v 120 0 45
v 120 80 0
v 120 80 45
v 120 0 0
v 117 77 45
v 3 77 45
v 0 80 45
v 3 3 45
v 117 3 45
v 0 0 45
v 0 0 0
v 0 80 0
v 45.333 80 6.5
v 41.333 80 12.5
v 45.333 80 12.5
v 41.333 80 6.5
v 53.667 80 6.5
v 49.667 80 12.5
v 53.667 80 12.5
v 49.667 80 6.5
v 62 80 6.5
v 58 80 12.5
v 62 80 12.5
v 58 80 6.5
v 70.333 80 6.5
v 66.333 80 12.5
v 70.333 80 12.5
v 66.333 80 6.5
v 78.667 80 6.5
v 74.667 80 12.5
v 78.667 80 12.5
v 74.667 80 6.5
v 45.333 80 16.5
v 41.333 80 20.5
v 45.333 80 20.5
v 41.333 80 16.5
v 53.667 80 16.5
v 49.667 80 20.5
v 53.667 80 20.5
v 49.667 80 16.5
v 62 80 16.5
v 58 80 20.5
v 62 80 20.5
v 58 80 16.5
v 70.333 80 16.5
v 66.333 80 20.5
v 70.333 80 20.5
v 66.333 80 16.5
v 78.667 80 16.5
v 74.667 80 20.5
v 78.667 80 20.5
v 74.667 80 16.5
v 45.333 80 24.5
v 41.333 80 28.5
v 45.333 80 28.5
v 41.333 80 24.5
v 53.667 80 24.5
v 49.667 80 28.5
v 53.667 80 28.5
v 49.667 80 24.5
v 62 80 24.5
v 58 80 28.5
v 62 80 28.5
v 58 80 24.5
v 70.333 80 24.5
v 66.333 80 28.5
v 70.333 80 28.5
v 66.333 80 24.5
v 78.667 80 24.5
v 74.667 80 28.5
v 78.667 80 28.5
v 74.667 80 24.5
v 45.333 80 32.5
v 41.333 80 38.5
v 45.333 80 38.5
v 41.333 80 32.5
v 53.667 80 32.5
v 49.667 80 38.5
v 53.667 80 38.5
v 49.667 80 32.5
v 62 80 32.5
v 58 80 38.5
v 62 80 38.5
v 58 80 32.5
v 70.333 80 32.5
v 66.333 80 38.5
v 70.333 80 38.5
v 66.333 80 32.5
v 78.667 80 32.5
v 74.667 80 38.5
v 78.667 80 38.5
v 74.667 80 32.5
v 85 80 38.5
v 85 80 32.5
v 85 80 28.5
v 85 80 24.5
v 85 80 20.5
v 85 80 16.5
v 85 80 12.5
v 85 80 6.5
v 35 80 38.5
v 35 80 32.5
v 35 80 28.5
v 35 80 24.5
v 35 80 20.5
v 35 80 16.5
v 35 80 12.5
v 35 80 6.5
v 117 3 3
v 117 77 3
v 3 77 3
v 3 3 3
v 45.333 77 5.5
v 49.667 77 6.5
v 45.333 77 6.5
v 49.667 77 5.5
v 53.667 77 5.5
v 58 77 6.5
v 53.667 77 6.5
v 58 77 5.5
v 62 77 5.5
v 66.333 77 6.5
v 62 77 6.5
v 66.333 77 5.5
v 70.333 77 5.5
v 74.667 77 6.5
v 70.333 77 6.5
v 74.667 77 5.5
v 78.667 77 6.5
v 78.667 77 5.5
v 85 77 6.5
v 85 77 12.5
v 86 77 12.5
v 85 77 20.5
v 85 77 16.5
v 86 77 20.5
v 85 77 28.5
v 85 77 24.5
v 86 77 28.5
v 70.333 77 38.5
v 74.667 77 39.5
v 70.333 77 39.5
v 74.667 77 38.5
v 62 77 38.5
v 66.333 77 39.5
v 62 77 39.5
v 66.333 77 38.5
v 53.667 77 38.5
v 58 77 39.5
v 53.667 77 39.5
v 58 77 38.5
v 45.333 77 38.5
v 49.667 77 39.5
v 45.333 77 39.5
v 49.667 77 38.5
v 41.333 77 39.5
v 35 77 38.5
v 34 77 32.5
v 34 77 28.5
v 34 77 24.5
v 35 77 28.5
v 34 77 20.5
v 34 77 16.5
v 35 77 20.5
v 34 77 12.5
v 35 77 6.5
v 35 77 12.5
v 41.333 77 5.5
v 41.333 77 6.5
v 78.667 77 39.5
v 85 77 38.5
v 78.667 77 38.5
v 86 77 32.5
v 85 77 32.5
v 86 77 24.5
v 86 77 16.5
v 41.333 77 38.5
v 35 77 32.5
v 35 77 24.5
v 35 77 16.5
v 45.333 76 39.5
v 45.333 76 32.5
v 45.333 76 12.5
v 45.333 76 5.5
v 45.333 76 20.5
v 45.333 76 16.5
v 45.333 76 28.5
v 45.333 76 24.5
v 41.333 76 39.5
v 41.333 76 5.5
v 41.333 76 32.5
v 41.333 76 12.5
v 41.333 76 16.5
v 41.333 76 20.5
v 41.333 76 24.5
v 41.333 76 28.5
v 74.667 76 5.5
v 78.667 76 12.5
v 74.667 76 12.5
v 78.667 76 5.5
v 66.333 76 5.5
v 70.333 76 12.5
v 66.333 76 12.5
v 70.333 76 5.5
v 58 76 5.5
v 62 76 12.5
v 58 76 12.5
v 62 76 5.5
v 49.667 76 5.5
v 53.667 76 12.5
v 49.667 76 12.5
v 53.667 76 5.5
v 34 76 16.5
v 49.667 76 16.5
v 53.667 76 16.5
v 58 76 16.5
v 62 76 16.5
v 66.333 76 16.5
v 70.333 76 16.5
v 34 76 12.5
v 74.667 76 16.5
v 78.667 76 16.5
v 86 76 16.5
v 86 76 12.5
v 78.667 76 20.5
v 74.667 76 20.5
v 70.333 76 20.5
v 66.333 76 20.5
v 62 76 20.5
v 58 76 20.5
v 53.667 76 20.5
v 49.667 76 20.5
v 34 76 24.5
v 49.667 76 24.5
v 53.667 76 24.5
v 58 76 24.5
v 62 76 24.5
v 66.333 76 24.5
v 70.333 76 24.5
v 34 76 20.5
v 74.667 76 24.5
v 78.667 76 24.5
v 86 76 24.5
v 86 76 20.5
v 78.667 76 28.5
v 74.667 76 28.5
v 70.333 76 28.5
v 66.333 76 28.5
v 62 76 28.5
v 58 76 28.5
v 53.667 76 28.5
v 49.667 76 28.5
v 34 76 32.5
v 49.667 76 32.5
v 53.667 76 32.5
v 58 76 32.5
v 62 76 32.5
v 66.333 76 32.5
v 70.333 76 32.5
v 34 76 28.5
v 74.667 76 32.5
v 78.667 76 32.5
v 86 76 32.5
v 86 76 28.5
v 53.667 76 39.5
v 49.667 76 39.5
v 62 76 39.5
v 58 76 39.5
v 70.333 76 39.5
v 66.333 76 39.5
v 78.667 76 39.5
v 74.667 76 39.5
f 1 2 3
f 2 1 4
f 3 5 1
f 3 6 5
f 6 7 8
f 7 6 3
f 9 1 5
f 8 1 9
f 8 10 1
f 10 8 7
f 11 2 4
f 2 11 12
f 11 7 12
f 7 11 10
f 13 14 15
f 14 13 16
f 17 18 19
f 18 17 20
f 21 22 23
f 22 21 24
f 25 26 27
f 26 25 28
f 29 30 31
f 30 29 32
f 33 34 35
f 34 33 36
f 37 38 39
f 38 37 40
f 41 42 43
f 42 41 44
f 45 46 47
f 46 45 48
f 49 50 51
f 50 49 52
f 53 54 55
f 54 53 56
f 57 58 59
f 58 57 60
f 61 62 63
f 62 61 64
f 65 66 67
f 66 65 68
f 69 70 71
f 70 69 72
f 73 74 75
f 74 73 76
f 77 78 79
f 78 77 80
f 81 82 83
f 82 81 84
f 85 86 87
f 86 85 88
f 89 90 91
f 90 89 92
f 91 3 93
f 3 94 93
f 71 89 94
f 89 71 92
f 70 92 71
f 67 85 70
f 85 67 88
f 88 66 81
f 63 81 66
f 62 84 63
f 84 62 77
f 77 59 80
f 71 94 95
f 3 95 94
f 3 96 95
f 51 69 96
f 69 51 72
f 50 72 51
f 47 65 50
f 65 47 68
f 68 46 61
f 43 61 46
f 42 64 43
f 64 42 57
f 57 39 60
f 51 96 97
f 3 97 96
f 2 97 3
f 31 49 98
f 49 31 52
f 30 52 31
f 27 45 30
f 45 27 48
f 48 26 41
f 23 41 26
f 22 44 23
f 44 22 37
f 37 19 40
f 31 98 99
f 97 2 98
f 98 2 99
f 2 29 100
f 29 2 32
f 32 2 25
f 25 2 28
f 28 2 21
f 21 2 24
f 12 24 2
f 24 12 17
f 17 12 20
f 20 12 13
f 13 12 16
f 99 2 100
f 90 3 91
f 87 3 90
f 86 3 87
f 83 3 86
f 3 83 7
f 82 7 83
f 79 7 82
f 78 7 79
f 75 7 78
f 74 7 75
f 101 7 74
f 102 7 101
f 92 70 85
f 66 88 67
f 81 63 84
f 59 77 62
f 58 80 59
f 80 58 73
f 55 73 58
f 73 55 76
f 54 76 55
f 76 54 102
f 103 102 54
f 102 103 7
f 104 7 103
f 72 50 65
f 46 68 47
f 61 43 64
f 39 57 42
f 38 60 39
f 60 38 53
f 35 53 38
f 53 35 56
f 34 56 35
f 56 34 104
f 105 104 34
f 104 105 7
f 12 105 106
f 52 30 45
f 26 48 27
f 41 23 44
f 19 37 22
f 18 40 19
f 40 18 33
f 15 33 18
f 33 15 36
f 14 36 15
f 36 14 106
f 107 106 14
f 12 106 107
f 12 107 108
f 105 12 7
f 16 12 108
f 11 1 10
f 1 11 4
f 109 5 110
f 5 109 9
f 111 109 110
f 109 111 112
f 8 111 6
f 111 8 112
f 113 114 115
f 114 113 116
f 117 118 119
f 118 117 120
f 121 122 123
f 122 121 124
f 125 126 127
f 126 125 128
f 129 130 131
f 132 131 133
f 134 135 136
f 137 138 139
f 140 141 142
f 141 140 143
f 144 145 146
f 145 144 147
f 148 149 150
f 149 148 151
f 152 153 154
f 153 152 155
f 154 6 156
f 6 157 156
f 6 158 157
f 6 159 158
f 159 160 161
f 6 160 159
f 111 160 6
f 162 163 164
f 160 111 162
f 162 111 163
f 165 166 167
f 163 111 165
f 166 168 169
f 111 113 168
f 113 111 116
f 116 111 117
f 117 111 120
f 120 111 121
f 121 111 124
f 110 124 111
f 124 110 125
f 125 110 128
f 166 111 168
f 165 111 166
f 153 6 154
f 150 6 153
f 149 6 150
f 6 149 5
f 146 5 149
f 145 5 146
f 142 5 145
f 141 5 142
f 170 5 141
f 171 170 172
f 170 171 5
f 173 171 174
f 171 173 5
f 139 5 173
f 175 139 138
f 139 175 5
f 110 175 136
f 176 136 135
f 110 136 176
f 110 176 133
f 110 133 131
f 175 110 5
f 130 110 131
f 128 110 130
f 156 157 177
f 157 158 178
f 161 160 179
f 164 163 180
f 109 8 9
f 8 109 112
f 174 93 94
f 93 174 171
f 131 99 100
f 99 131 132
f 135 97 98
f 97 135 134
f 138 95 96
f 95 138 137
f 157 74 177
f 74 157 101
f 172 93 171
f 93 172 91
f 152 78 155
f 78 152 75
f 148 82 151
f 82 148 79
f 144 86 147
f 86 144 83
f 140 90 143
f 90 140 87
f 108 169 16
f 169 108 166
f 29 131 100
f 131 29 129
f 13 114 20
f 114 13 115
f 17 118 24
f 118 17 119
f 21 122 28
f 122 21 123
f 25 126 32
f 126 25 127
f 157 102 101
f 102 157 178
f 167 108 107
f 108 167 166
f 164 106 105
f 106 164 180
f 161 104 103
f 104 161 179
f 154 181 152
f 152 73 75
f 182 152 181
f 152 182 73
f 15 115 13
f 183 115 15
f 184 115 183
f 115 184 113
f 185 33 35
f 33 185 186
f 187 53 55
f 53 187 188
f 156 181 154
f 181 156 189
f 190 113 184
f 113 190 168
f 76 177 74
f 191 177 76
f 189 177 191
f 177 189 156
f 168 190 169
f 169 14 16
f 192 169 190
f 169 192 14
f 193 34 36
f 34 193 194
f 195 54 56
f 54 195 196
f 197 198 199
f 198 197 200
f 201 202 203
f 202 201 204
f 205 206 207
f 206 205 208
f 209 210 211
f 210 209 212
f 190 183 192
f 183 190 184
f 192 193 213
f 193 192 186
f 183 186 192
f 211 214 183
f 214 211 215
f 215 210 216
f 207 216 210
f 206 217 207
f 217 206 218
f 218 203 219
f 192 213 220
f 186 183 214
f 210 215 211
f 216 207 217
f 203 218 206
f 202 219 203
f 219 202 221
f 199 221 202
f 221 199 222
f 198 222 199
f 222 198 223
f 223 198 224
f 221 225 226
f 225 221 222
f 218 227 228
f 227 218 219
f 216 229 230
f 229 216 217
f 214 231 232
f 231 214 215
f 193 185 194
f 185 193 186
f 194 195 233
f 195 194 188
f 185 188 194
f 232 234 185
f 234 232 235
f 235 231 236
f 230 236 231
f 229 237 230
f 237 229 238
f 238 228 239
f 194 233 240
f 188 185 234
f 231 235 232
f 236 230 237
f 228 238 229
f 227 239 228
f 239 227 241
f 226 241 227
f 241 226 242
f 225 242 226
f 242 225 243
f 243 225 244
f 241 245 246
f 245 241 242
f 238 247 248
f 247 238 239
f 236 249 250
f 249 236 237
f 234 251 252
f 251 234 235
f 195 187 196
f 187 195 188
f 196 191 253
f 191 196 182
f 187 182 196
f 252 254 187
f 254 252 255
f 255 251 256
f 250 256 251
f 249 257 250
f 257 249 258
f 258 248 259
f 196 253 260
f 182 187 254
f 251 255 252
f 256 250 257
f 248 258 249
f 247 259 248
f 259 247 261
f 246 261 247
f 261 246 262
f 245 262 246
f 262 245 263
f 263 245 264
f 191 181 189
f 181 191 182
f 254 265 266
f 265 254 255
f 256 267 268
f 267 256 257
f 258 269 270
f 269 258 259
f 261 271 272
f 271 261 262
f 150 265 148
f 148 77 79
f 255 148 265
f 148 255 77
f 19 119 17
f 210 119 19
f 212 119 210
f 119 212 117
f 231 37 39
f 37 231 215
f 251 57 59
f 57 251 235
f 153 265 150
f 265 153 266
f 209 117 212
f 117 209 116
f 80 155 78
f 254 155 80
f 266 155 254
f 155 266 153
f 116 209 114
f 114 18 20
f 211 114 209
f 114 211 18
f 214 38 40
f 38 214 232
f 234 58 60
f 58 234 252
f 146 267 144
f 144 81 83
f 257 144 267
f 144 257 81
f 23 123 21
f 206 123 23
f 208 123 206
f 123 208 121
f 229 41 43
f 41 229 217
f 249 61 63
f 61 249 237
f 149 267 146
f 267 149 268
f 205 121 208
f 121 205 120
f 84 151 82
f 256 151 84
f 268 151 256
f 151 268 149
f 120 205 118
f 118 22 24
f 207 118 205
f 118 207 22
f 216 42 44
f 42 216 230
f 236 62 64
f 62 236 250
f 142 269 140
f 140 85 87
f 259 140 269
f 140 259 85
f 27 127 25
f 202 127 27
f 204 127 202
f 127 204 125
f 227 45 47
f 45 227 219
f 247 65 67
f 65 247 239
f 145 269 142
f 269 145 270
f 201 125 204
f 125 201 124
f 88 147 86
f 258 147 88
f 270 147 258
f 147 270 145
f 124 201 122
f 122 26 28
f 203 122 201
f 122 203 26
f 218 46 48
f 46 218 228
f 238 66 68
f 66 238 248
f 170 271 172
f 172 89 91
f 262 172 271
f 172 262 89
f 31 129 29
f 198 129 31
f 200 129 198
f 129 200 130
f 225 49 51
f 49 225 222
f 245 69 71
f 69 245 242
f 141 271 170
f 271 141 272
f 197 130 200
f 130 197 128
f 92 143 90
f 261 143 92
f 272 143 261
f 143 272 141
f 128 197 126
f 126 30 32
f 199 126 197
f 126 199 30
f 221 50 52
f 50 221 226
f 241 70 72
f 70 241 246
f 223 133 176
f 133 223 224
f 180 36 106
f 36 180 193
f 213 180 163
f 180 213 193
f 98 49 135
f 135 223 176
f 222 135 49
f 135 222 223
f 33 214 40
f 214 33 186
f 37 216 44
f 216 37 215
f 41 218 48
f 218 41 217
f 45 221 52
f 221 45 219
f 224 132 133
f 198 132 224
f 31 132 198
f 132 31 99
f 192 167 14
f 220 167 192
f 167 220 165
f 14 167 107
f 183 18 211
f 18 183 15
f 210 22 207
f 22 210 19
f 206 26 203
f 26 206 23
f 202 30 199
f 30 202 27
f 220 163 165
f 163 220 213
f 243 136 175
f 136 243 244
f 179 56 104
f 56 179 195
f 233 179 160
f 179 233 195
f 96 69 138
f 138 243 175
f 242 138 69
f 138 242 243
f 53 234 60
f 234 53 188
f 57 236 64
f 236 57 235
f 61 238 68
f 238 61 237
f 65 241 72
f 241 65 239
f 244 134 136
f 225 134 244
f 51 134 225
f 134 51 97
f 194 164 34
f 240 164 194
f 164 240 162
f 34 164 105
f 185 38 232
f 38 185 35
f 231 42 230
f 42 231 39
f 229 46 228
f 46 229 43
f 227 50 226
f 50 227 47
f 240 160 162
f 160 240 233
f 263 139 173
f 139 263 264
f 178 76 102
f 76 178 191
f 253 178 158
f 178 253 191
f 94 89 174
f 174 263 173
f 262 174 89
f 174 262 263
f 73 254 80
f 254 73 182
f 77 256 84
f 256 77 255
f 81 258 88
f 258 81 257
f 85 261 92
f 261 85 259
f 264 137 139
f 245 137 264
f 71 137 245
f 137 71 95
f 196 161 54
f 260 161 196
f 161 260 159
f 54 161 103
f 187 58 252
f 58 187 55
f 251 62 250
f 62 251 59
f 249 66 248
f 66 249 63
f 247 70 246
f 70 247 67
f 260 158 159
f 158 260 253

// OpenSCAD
$fn = 32;

// ----------------------------------------------------------------------
// Vent box: crossgrid enclosure
// ----------------------------------------------------------------------

// --- parameters (mm) ---
box_l = 120;              // box length, X
box_w = 80;               // box width, Y
box_h = 45;               // box height, Z
wall_t = 3;               // shell wall thickness
win_l = 50;               // vent window width, X
win_h = 32;               // vent window height, Z
bar_w = 4;                // grid bar width
n_v = 5;                  // vertical bar count
n_h = 3;                  // horizontal bar count
fit_tol = 0.1;            // tolerance for press fits, mm
free_tol = 0.5;           // tolerance for clearance fits, mm

win_z0 = (box_h - win_h) / 2;  // window lower edge Z
v_step = win_l / (n_v + 1);  // vertical bar step
h_step = win_h / (n_h + 1);  // horizontal bar step

difference() {
  union() {
    difference() {
      cube([box_l, box_w, box_h]);
  translate([wall_t, wall_t, wall_t])
    cube([box_l - 2 * wall_t, box_w - 2 * wall_t, box_h]);
  translate([(box_l - win_l) / 2, box_w - wall_t - 1, win_z0])
    cube([win_l, wall_t + 2, win_h]);
    }
    for (i = [1 : n_v])
      translate([(box_l - win_l) / 2 + i * v_step - bar_w / 2,
                 box_w - wall_t - 1, win_z0 - 1])
        cube([bar_w, wall_t + 1, win_h + 2]);
    for (i = [1 : n_h])
      translate([(box_l - win_l) / 2 - 1, box_w - wall_t - 1,
                 win_z0 + i * h_step - bar_w / 2])
        cube([win_l + 2, wall_t + 1, bar_w]);
  }
}
